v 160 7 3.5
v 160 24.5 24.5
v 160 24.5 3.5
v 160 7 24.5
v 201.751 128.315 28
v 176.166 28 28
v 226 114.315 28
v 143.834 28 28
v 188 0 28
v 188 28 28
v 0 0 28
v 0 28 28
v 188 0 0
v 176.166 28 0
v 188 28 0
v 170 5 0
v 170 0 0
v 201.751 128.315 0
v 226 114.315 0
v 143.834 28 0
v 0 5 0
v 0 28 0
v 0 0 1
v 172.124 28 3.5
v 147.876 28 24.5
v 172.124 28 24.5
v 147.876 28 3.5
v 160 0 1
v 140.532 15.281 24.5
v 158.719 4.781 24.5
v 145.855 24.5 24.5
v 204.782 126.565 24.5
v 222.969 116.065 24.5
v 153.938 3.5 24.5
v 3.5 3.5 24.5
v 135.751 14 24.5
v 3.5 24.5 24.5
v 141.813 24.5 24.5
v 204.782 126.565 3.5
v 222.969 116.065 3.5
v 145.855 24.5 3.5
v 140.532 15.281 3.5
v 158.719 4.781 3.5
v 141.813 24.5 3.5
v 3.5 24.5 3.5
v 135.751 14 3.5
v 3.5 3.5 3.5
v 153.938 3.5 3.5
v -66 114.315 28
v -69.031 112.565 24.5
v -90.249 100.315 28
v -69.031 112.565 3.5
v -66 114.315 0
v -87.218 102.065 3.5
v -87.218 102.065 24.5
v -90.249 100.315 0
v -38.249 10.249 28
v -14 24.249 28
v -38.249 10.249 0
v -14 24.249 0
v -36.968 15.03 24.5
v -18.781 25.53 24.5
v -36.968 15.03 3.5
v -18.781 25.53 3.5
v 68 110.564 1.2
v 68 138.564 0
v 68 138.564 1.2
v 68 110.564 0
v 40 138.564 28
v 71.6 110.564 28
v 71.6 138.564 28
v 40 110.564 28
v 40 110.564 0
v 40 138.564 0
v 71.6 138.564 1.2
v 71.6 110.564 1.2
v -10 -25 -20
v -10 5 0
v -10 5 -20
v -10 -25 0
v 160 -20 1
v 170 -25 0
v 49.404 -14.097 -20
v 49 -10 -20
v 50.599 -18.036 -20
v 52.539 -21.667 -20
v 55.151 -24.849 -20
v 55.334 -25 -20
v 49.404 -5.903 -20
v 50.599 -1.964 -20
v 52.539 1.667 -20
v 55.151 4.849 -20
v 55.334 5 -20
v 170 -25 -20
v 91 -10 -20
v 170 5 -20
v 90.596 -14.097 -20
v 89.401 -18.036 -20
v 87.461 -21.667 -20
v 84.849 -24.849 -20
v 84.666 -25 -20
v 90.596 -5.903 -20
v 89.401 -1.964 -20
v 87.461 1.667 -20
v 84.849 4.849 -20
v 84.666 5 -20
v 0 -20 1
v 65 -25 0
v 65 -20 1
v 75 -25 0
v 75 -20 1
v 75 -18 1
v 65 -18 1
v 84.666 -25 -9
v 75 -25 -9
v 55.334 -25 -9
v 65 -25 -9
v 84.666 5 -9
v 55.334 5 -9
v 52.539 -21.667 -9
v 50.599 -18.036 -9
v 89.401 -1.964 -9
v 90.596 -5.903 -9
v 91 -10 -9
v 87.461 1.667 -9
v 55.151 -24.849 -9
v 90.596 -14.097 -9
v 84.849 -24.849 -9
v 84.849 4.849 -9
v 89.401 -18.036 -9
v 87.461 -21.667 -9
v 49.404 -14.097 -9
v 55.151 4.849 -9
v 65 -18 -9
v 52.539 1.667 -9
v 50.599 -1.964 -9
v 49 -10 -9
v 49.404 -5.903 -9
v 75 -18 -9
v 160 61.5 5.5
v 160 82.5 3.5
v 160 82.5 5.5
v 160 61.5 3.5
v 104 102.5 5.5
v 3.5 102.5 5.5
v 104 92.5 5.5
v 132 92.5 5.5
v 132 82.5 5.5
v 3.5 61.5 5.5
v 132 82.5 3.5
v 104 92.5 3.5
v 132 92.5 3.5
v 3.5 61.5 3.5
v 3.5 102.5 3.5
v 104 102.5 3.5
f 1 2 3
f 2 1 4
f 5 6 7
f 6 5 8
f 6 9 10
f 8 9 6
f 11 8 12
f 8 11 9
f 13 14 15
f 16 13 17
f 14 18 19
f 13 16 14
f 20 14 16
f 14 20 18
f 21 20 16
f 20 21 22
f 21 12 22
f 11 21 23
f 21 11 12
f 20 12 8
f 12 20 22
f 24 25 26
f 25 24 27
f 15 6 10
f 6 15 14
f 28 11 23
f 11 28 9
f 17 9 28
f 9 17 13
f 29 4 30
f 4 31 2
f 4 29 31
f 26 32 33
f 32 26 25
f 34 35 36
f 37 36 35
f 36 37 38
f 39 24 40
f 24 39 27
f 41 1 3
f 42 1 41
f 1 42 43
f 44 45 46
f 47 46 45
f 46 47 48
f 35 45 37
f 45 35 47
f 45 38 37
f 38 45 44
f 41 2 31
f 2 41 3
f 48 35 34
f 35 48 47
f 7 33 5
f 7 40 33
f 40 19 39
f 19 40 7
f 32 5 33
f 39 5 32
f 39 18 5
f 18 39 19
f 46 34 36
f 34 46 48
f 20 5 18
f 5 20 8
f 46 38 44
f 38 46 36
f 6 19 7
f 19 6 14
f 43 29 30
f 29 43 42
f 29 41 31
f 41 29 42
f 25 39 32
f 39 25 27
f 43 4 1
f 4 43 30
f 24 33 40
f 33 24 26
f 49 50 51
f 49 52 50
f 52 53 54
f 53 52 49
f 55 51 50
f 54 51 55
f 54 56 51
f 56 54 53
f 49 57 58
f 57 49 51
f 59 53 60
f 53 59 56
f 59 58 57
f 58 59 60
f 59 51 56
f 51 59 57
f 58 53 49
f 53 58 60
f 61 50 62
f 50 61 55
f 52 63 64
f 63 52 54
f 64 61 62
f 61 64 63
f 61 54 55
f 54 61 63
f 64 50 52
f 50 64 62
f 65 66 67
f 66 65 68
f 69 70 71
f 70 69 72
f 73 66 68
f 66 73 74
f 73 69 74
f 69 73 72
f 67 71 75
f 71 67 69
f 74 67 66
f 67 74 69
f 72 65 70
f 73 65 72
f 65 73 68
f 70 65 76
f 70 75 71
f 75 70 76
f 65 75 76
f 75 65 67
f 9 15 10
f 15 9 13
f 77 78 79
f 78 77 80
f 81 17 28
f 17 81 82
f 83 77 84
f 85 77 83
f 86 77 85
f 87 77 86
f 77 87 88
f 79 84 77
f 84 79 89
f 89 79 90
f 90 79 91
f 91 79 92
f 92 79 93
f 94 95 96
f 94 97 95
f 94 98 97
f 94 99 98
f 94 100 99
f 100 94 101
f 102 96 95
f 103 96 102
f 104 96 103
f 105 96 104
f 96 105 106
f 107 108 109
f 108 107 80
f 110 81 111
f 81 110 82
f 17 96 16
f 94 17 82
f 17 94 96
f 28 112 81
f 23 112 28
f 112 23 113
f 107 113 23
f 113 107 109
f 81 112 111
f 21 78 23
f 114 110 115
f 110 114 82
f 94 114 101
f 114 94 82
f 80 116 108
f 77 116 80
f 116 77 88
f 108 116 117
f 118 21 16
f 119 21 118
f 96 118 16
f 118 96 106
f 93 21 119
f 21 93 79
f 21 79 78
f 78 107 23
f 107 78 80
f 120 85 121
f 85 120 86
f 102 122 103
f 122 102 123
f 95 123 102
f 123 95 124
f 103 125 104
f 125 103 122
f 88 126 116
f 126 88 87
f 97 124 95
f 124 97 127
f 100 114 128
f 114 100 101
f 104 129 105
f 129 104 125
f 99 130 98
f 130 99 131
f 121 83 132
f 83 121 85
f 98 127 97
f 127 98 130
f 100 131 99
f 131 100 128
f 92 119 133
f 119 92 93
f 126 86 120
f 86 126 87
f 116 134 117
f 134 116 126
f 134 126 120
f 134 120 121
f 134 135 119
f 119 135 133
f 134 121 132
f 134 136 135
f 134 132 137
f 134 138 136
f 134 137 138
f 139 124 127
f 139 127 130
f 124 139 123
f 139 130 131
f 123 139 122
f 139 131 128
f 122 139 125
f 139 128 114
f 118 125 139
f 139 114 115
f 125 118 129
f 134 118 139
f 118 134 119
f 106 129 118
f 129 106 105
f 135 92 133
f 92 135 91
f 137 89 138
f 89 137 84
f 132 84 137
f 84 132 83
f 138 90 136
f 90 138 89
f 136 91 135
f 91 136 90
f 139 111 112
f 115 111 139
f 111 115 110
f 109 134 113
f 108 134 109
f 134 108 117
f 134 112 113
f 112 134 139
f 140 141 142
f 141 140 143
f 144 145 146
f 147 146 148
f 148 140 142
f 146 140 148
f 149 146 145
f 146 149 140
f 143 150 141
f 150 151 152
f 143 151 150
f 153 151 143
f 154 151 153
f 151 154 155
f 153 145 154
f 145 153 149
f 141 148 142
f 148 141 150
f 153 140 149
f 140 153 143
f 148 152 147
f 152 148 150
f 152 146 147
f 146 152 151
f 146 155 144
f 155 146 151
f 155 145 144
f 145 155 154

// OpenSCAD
// Penrose Impossible Triangle — Lamp / Night Light
// Optical illusion: each corner looks like a solid 90° join
// Light shines through the gap at the trick corner
// DUAL COLOR: frame (opaque dark) + light diffuser panel (translucent PETG)
// P2S: 0.2mm, 3 walls, 10% infill
// Base holds E14 LED bulb or tea light

SIDE_L   = 160;    // Triangle side length
BEAM_W   = 28;     // Beam cross-section width
BEAM_H   = 28;
WALL     = 3.5;
GAP      = 1.2;    // Trick gap at impossible corner
PANEL_T  = 2.0;    // Diffuser panel thickness

// ── One beam segment ──────────────────────────────────
module beam(length) {
    difference() {
        cube([length, BEAM_W, BEAM_H]);
        // Hollow core (diffuser window channel)
        translate([WALL, WALL, WALL])
            cube([length - WALL, BEAM_W - WALL*2, BEAM_H - WALL*2]);
    }
}

// ── Corner joint (solid) ──────────────────────────────
module corner_joint() {
    cube([BEAM_W, BEAM_W, BEAM_H]);
}

// ── Diffuser panel (fits inside beam hollow) ──────────
module diffuser(length) {
    translate([WALL, WALL, WALL])
        cube([length - WALL, BEAM_W - WALL*2, PANEL_T]);
}

// ── Impossible triangle assembly ─────────────────────
module impossible_triangle() {
    // The trick: one corner has a step that creates the illusion
    // Bottom beam
    beam(SIDE_L);
    // Right beam (angled 60°)
    translate([SIDE_L, 0, 0])
        corner_joint();
    translate([SIDE_L, 0, 0])
        rotate([0, 0, 60])
            beam(SIDE_L - BEAM_W);
    // Left return (creates illusion at top-left)
    rotate([0, 0, 120])
        translate([BEAM_W, 0, 0])
            beam(SIDE_L - BEAM_W * 2);
    // Trick corner: offset step creates impossible join
    translate([SIDE_L * cos(60) * 0.5, SIDE_L * sin(60) - BEAM_W, 0]) {
        // Normal-view corner
        corner_joint();
        // Hidden step (only visible from behind)
        translate([BEAM_W, 0, GAP])
            cube([GAP * 3, BEAM_W, BEAM_H - GAP]);
    }
}

// ── Base for standing display ─────────────────────────
module base() {
    translate([-10, -25, -20]) {
        difference() {
            hull() {
                cube([SIDE_L + 20, 30, 20]);
                translate([10, 5, 20])
                    cube([SIDE_L, 20, 1]);
            }
            // Bulb cavity (tea light, 40mm dia)
            translate([SIDE_L/2, 15, -1])
                cylinder(d = 42, h = 12, $fn = 32);
            // Cable exit slot
            translate([SIDE_L/2 - 5, -1, 6])
                cube([10, 8, 15]);
        }
    }
}

// Color 1: frame
impossible_triangle();
base();
// Color 2: diffuser panels (translucent PETG — print separately)
translate([0, BEAM_W + 30, 0]) {
    diffuser(SIDE_L);
    translate([0, 10, 0]) diffuser(SIDE_L - BEAM_W);
    translate([0, 20, 0]) diffuser(SIDE_L - BEAM_W * 2);
}
